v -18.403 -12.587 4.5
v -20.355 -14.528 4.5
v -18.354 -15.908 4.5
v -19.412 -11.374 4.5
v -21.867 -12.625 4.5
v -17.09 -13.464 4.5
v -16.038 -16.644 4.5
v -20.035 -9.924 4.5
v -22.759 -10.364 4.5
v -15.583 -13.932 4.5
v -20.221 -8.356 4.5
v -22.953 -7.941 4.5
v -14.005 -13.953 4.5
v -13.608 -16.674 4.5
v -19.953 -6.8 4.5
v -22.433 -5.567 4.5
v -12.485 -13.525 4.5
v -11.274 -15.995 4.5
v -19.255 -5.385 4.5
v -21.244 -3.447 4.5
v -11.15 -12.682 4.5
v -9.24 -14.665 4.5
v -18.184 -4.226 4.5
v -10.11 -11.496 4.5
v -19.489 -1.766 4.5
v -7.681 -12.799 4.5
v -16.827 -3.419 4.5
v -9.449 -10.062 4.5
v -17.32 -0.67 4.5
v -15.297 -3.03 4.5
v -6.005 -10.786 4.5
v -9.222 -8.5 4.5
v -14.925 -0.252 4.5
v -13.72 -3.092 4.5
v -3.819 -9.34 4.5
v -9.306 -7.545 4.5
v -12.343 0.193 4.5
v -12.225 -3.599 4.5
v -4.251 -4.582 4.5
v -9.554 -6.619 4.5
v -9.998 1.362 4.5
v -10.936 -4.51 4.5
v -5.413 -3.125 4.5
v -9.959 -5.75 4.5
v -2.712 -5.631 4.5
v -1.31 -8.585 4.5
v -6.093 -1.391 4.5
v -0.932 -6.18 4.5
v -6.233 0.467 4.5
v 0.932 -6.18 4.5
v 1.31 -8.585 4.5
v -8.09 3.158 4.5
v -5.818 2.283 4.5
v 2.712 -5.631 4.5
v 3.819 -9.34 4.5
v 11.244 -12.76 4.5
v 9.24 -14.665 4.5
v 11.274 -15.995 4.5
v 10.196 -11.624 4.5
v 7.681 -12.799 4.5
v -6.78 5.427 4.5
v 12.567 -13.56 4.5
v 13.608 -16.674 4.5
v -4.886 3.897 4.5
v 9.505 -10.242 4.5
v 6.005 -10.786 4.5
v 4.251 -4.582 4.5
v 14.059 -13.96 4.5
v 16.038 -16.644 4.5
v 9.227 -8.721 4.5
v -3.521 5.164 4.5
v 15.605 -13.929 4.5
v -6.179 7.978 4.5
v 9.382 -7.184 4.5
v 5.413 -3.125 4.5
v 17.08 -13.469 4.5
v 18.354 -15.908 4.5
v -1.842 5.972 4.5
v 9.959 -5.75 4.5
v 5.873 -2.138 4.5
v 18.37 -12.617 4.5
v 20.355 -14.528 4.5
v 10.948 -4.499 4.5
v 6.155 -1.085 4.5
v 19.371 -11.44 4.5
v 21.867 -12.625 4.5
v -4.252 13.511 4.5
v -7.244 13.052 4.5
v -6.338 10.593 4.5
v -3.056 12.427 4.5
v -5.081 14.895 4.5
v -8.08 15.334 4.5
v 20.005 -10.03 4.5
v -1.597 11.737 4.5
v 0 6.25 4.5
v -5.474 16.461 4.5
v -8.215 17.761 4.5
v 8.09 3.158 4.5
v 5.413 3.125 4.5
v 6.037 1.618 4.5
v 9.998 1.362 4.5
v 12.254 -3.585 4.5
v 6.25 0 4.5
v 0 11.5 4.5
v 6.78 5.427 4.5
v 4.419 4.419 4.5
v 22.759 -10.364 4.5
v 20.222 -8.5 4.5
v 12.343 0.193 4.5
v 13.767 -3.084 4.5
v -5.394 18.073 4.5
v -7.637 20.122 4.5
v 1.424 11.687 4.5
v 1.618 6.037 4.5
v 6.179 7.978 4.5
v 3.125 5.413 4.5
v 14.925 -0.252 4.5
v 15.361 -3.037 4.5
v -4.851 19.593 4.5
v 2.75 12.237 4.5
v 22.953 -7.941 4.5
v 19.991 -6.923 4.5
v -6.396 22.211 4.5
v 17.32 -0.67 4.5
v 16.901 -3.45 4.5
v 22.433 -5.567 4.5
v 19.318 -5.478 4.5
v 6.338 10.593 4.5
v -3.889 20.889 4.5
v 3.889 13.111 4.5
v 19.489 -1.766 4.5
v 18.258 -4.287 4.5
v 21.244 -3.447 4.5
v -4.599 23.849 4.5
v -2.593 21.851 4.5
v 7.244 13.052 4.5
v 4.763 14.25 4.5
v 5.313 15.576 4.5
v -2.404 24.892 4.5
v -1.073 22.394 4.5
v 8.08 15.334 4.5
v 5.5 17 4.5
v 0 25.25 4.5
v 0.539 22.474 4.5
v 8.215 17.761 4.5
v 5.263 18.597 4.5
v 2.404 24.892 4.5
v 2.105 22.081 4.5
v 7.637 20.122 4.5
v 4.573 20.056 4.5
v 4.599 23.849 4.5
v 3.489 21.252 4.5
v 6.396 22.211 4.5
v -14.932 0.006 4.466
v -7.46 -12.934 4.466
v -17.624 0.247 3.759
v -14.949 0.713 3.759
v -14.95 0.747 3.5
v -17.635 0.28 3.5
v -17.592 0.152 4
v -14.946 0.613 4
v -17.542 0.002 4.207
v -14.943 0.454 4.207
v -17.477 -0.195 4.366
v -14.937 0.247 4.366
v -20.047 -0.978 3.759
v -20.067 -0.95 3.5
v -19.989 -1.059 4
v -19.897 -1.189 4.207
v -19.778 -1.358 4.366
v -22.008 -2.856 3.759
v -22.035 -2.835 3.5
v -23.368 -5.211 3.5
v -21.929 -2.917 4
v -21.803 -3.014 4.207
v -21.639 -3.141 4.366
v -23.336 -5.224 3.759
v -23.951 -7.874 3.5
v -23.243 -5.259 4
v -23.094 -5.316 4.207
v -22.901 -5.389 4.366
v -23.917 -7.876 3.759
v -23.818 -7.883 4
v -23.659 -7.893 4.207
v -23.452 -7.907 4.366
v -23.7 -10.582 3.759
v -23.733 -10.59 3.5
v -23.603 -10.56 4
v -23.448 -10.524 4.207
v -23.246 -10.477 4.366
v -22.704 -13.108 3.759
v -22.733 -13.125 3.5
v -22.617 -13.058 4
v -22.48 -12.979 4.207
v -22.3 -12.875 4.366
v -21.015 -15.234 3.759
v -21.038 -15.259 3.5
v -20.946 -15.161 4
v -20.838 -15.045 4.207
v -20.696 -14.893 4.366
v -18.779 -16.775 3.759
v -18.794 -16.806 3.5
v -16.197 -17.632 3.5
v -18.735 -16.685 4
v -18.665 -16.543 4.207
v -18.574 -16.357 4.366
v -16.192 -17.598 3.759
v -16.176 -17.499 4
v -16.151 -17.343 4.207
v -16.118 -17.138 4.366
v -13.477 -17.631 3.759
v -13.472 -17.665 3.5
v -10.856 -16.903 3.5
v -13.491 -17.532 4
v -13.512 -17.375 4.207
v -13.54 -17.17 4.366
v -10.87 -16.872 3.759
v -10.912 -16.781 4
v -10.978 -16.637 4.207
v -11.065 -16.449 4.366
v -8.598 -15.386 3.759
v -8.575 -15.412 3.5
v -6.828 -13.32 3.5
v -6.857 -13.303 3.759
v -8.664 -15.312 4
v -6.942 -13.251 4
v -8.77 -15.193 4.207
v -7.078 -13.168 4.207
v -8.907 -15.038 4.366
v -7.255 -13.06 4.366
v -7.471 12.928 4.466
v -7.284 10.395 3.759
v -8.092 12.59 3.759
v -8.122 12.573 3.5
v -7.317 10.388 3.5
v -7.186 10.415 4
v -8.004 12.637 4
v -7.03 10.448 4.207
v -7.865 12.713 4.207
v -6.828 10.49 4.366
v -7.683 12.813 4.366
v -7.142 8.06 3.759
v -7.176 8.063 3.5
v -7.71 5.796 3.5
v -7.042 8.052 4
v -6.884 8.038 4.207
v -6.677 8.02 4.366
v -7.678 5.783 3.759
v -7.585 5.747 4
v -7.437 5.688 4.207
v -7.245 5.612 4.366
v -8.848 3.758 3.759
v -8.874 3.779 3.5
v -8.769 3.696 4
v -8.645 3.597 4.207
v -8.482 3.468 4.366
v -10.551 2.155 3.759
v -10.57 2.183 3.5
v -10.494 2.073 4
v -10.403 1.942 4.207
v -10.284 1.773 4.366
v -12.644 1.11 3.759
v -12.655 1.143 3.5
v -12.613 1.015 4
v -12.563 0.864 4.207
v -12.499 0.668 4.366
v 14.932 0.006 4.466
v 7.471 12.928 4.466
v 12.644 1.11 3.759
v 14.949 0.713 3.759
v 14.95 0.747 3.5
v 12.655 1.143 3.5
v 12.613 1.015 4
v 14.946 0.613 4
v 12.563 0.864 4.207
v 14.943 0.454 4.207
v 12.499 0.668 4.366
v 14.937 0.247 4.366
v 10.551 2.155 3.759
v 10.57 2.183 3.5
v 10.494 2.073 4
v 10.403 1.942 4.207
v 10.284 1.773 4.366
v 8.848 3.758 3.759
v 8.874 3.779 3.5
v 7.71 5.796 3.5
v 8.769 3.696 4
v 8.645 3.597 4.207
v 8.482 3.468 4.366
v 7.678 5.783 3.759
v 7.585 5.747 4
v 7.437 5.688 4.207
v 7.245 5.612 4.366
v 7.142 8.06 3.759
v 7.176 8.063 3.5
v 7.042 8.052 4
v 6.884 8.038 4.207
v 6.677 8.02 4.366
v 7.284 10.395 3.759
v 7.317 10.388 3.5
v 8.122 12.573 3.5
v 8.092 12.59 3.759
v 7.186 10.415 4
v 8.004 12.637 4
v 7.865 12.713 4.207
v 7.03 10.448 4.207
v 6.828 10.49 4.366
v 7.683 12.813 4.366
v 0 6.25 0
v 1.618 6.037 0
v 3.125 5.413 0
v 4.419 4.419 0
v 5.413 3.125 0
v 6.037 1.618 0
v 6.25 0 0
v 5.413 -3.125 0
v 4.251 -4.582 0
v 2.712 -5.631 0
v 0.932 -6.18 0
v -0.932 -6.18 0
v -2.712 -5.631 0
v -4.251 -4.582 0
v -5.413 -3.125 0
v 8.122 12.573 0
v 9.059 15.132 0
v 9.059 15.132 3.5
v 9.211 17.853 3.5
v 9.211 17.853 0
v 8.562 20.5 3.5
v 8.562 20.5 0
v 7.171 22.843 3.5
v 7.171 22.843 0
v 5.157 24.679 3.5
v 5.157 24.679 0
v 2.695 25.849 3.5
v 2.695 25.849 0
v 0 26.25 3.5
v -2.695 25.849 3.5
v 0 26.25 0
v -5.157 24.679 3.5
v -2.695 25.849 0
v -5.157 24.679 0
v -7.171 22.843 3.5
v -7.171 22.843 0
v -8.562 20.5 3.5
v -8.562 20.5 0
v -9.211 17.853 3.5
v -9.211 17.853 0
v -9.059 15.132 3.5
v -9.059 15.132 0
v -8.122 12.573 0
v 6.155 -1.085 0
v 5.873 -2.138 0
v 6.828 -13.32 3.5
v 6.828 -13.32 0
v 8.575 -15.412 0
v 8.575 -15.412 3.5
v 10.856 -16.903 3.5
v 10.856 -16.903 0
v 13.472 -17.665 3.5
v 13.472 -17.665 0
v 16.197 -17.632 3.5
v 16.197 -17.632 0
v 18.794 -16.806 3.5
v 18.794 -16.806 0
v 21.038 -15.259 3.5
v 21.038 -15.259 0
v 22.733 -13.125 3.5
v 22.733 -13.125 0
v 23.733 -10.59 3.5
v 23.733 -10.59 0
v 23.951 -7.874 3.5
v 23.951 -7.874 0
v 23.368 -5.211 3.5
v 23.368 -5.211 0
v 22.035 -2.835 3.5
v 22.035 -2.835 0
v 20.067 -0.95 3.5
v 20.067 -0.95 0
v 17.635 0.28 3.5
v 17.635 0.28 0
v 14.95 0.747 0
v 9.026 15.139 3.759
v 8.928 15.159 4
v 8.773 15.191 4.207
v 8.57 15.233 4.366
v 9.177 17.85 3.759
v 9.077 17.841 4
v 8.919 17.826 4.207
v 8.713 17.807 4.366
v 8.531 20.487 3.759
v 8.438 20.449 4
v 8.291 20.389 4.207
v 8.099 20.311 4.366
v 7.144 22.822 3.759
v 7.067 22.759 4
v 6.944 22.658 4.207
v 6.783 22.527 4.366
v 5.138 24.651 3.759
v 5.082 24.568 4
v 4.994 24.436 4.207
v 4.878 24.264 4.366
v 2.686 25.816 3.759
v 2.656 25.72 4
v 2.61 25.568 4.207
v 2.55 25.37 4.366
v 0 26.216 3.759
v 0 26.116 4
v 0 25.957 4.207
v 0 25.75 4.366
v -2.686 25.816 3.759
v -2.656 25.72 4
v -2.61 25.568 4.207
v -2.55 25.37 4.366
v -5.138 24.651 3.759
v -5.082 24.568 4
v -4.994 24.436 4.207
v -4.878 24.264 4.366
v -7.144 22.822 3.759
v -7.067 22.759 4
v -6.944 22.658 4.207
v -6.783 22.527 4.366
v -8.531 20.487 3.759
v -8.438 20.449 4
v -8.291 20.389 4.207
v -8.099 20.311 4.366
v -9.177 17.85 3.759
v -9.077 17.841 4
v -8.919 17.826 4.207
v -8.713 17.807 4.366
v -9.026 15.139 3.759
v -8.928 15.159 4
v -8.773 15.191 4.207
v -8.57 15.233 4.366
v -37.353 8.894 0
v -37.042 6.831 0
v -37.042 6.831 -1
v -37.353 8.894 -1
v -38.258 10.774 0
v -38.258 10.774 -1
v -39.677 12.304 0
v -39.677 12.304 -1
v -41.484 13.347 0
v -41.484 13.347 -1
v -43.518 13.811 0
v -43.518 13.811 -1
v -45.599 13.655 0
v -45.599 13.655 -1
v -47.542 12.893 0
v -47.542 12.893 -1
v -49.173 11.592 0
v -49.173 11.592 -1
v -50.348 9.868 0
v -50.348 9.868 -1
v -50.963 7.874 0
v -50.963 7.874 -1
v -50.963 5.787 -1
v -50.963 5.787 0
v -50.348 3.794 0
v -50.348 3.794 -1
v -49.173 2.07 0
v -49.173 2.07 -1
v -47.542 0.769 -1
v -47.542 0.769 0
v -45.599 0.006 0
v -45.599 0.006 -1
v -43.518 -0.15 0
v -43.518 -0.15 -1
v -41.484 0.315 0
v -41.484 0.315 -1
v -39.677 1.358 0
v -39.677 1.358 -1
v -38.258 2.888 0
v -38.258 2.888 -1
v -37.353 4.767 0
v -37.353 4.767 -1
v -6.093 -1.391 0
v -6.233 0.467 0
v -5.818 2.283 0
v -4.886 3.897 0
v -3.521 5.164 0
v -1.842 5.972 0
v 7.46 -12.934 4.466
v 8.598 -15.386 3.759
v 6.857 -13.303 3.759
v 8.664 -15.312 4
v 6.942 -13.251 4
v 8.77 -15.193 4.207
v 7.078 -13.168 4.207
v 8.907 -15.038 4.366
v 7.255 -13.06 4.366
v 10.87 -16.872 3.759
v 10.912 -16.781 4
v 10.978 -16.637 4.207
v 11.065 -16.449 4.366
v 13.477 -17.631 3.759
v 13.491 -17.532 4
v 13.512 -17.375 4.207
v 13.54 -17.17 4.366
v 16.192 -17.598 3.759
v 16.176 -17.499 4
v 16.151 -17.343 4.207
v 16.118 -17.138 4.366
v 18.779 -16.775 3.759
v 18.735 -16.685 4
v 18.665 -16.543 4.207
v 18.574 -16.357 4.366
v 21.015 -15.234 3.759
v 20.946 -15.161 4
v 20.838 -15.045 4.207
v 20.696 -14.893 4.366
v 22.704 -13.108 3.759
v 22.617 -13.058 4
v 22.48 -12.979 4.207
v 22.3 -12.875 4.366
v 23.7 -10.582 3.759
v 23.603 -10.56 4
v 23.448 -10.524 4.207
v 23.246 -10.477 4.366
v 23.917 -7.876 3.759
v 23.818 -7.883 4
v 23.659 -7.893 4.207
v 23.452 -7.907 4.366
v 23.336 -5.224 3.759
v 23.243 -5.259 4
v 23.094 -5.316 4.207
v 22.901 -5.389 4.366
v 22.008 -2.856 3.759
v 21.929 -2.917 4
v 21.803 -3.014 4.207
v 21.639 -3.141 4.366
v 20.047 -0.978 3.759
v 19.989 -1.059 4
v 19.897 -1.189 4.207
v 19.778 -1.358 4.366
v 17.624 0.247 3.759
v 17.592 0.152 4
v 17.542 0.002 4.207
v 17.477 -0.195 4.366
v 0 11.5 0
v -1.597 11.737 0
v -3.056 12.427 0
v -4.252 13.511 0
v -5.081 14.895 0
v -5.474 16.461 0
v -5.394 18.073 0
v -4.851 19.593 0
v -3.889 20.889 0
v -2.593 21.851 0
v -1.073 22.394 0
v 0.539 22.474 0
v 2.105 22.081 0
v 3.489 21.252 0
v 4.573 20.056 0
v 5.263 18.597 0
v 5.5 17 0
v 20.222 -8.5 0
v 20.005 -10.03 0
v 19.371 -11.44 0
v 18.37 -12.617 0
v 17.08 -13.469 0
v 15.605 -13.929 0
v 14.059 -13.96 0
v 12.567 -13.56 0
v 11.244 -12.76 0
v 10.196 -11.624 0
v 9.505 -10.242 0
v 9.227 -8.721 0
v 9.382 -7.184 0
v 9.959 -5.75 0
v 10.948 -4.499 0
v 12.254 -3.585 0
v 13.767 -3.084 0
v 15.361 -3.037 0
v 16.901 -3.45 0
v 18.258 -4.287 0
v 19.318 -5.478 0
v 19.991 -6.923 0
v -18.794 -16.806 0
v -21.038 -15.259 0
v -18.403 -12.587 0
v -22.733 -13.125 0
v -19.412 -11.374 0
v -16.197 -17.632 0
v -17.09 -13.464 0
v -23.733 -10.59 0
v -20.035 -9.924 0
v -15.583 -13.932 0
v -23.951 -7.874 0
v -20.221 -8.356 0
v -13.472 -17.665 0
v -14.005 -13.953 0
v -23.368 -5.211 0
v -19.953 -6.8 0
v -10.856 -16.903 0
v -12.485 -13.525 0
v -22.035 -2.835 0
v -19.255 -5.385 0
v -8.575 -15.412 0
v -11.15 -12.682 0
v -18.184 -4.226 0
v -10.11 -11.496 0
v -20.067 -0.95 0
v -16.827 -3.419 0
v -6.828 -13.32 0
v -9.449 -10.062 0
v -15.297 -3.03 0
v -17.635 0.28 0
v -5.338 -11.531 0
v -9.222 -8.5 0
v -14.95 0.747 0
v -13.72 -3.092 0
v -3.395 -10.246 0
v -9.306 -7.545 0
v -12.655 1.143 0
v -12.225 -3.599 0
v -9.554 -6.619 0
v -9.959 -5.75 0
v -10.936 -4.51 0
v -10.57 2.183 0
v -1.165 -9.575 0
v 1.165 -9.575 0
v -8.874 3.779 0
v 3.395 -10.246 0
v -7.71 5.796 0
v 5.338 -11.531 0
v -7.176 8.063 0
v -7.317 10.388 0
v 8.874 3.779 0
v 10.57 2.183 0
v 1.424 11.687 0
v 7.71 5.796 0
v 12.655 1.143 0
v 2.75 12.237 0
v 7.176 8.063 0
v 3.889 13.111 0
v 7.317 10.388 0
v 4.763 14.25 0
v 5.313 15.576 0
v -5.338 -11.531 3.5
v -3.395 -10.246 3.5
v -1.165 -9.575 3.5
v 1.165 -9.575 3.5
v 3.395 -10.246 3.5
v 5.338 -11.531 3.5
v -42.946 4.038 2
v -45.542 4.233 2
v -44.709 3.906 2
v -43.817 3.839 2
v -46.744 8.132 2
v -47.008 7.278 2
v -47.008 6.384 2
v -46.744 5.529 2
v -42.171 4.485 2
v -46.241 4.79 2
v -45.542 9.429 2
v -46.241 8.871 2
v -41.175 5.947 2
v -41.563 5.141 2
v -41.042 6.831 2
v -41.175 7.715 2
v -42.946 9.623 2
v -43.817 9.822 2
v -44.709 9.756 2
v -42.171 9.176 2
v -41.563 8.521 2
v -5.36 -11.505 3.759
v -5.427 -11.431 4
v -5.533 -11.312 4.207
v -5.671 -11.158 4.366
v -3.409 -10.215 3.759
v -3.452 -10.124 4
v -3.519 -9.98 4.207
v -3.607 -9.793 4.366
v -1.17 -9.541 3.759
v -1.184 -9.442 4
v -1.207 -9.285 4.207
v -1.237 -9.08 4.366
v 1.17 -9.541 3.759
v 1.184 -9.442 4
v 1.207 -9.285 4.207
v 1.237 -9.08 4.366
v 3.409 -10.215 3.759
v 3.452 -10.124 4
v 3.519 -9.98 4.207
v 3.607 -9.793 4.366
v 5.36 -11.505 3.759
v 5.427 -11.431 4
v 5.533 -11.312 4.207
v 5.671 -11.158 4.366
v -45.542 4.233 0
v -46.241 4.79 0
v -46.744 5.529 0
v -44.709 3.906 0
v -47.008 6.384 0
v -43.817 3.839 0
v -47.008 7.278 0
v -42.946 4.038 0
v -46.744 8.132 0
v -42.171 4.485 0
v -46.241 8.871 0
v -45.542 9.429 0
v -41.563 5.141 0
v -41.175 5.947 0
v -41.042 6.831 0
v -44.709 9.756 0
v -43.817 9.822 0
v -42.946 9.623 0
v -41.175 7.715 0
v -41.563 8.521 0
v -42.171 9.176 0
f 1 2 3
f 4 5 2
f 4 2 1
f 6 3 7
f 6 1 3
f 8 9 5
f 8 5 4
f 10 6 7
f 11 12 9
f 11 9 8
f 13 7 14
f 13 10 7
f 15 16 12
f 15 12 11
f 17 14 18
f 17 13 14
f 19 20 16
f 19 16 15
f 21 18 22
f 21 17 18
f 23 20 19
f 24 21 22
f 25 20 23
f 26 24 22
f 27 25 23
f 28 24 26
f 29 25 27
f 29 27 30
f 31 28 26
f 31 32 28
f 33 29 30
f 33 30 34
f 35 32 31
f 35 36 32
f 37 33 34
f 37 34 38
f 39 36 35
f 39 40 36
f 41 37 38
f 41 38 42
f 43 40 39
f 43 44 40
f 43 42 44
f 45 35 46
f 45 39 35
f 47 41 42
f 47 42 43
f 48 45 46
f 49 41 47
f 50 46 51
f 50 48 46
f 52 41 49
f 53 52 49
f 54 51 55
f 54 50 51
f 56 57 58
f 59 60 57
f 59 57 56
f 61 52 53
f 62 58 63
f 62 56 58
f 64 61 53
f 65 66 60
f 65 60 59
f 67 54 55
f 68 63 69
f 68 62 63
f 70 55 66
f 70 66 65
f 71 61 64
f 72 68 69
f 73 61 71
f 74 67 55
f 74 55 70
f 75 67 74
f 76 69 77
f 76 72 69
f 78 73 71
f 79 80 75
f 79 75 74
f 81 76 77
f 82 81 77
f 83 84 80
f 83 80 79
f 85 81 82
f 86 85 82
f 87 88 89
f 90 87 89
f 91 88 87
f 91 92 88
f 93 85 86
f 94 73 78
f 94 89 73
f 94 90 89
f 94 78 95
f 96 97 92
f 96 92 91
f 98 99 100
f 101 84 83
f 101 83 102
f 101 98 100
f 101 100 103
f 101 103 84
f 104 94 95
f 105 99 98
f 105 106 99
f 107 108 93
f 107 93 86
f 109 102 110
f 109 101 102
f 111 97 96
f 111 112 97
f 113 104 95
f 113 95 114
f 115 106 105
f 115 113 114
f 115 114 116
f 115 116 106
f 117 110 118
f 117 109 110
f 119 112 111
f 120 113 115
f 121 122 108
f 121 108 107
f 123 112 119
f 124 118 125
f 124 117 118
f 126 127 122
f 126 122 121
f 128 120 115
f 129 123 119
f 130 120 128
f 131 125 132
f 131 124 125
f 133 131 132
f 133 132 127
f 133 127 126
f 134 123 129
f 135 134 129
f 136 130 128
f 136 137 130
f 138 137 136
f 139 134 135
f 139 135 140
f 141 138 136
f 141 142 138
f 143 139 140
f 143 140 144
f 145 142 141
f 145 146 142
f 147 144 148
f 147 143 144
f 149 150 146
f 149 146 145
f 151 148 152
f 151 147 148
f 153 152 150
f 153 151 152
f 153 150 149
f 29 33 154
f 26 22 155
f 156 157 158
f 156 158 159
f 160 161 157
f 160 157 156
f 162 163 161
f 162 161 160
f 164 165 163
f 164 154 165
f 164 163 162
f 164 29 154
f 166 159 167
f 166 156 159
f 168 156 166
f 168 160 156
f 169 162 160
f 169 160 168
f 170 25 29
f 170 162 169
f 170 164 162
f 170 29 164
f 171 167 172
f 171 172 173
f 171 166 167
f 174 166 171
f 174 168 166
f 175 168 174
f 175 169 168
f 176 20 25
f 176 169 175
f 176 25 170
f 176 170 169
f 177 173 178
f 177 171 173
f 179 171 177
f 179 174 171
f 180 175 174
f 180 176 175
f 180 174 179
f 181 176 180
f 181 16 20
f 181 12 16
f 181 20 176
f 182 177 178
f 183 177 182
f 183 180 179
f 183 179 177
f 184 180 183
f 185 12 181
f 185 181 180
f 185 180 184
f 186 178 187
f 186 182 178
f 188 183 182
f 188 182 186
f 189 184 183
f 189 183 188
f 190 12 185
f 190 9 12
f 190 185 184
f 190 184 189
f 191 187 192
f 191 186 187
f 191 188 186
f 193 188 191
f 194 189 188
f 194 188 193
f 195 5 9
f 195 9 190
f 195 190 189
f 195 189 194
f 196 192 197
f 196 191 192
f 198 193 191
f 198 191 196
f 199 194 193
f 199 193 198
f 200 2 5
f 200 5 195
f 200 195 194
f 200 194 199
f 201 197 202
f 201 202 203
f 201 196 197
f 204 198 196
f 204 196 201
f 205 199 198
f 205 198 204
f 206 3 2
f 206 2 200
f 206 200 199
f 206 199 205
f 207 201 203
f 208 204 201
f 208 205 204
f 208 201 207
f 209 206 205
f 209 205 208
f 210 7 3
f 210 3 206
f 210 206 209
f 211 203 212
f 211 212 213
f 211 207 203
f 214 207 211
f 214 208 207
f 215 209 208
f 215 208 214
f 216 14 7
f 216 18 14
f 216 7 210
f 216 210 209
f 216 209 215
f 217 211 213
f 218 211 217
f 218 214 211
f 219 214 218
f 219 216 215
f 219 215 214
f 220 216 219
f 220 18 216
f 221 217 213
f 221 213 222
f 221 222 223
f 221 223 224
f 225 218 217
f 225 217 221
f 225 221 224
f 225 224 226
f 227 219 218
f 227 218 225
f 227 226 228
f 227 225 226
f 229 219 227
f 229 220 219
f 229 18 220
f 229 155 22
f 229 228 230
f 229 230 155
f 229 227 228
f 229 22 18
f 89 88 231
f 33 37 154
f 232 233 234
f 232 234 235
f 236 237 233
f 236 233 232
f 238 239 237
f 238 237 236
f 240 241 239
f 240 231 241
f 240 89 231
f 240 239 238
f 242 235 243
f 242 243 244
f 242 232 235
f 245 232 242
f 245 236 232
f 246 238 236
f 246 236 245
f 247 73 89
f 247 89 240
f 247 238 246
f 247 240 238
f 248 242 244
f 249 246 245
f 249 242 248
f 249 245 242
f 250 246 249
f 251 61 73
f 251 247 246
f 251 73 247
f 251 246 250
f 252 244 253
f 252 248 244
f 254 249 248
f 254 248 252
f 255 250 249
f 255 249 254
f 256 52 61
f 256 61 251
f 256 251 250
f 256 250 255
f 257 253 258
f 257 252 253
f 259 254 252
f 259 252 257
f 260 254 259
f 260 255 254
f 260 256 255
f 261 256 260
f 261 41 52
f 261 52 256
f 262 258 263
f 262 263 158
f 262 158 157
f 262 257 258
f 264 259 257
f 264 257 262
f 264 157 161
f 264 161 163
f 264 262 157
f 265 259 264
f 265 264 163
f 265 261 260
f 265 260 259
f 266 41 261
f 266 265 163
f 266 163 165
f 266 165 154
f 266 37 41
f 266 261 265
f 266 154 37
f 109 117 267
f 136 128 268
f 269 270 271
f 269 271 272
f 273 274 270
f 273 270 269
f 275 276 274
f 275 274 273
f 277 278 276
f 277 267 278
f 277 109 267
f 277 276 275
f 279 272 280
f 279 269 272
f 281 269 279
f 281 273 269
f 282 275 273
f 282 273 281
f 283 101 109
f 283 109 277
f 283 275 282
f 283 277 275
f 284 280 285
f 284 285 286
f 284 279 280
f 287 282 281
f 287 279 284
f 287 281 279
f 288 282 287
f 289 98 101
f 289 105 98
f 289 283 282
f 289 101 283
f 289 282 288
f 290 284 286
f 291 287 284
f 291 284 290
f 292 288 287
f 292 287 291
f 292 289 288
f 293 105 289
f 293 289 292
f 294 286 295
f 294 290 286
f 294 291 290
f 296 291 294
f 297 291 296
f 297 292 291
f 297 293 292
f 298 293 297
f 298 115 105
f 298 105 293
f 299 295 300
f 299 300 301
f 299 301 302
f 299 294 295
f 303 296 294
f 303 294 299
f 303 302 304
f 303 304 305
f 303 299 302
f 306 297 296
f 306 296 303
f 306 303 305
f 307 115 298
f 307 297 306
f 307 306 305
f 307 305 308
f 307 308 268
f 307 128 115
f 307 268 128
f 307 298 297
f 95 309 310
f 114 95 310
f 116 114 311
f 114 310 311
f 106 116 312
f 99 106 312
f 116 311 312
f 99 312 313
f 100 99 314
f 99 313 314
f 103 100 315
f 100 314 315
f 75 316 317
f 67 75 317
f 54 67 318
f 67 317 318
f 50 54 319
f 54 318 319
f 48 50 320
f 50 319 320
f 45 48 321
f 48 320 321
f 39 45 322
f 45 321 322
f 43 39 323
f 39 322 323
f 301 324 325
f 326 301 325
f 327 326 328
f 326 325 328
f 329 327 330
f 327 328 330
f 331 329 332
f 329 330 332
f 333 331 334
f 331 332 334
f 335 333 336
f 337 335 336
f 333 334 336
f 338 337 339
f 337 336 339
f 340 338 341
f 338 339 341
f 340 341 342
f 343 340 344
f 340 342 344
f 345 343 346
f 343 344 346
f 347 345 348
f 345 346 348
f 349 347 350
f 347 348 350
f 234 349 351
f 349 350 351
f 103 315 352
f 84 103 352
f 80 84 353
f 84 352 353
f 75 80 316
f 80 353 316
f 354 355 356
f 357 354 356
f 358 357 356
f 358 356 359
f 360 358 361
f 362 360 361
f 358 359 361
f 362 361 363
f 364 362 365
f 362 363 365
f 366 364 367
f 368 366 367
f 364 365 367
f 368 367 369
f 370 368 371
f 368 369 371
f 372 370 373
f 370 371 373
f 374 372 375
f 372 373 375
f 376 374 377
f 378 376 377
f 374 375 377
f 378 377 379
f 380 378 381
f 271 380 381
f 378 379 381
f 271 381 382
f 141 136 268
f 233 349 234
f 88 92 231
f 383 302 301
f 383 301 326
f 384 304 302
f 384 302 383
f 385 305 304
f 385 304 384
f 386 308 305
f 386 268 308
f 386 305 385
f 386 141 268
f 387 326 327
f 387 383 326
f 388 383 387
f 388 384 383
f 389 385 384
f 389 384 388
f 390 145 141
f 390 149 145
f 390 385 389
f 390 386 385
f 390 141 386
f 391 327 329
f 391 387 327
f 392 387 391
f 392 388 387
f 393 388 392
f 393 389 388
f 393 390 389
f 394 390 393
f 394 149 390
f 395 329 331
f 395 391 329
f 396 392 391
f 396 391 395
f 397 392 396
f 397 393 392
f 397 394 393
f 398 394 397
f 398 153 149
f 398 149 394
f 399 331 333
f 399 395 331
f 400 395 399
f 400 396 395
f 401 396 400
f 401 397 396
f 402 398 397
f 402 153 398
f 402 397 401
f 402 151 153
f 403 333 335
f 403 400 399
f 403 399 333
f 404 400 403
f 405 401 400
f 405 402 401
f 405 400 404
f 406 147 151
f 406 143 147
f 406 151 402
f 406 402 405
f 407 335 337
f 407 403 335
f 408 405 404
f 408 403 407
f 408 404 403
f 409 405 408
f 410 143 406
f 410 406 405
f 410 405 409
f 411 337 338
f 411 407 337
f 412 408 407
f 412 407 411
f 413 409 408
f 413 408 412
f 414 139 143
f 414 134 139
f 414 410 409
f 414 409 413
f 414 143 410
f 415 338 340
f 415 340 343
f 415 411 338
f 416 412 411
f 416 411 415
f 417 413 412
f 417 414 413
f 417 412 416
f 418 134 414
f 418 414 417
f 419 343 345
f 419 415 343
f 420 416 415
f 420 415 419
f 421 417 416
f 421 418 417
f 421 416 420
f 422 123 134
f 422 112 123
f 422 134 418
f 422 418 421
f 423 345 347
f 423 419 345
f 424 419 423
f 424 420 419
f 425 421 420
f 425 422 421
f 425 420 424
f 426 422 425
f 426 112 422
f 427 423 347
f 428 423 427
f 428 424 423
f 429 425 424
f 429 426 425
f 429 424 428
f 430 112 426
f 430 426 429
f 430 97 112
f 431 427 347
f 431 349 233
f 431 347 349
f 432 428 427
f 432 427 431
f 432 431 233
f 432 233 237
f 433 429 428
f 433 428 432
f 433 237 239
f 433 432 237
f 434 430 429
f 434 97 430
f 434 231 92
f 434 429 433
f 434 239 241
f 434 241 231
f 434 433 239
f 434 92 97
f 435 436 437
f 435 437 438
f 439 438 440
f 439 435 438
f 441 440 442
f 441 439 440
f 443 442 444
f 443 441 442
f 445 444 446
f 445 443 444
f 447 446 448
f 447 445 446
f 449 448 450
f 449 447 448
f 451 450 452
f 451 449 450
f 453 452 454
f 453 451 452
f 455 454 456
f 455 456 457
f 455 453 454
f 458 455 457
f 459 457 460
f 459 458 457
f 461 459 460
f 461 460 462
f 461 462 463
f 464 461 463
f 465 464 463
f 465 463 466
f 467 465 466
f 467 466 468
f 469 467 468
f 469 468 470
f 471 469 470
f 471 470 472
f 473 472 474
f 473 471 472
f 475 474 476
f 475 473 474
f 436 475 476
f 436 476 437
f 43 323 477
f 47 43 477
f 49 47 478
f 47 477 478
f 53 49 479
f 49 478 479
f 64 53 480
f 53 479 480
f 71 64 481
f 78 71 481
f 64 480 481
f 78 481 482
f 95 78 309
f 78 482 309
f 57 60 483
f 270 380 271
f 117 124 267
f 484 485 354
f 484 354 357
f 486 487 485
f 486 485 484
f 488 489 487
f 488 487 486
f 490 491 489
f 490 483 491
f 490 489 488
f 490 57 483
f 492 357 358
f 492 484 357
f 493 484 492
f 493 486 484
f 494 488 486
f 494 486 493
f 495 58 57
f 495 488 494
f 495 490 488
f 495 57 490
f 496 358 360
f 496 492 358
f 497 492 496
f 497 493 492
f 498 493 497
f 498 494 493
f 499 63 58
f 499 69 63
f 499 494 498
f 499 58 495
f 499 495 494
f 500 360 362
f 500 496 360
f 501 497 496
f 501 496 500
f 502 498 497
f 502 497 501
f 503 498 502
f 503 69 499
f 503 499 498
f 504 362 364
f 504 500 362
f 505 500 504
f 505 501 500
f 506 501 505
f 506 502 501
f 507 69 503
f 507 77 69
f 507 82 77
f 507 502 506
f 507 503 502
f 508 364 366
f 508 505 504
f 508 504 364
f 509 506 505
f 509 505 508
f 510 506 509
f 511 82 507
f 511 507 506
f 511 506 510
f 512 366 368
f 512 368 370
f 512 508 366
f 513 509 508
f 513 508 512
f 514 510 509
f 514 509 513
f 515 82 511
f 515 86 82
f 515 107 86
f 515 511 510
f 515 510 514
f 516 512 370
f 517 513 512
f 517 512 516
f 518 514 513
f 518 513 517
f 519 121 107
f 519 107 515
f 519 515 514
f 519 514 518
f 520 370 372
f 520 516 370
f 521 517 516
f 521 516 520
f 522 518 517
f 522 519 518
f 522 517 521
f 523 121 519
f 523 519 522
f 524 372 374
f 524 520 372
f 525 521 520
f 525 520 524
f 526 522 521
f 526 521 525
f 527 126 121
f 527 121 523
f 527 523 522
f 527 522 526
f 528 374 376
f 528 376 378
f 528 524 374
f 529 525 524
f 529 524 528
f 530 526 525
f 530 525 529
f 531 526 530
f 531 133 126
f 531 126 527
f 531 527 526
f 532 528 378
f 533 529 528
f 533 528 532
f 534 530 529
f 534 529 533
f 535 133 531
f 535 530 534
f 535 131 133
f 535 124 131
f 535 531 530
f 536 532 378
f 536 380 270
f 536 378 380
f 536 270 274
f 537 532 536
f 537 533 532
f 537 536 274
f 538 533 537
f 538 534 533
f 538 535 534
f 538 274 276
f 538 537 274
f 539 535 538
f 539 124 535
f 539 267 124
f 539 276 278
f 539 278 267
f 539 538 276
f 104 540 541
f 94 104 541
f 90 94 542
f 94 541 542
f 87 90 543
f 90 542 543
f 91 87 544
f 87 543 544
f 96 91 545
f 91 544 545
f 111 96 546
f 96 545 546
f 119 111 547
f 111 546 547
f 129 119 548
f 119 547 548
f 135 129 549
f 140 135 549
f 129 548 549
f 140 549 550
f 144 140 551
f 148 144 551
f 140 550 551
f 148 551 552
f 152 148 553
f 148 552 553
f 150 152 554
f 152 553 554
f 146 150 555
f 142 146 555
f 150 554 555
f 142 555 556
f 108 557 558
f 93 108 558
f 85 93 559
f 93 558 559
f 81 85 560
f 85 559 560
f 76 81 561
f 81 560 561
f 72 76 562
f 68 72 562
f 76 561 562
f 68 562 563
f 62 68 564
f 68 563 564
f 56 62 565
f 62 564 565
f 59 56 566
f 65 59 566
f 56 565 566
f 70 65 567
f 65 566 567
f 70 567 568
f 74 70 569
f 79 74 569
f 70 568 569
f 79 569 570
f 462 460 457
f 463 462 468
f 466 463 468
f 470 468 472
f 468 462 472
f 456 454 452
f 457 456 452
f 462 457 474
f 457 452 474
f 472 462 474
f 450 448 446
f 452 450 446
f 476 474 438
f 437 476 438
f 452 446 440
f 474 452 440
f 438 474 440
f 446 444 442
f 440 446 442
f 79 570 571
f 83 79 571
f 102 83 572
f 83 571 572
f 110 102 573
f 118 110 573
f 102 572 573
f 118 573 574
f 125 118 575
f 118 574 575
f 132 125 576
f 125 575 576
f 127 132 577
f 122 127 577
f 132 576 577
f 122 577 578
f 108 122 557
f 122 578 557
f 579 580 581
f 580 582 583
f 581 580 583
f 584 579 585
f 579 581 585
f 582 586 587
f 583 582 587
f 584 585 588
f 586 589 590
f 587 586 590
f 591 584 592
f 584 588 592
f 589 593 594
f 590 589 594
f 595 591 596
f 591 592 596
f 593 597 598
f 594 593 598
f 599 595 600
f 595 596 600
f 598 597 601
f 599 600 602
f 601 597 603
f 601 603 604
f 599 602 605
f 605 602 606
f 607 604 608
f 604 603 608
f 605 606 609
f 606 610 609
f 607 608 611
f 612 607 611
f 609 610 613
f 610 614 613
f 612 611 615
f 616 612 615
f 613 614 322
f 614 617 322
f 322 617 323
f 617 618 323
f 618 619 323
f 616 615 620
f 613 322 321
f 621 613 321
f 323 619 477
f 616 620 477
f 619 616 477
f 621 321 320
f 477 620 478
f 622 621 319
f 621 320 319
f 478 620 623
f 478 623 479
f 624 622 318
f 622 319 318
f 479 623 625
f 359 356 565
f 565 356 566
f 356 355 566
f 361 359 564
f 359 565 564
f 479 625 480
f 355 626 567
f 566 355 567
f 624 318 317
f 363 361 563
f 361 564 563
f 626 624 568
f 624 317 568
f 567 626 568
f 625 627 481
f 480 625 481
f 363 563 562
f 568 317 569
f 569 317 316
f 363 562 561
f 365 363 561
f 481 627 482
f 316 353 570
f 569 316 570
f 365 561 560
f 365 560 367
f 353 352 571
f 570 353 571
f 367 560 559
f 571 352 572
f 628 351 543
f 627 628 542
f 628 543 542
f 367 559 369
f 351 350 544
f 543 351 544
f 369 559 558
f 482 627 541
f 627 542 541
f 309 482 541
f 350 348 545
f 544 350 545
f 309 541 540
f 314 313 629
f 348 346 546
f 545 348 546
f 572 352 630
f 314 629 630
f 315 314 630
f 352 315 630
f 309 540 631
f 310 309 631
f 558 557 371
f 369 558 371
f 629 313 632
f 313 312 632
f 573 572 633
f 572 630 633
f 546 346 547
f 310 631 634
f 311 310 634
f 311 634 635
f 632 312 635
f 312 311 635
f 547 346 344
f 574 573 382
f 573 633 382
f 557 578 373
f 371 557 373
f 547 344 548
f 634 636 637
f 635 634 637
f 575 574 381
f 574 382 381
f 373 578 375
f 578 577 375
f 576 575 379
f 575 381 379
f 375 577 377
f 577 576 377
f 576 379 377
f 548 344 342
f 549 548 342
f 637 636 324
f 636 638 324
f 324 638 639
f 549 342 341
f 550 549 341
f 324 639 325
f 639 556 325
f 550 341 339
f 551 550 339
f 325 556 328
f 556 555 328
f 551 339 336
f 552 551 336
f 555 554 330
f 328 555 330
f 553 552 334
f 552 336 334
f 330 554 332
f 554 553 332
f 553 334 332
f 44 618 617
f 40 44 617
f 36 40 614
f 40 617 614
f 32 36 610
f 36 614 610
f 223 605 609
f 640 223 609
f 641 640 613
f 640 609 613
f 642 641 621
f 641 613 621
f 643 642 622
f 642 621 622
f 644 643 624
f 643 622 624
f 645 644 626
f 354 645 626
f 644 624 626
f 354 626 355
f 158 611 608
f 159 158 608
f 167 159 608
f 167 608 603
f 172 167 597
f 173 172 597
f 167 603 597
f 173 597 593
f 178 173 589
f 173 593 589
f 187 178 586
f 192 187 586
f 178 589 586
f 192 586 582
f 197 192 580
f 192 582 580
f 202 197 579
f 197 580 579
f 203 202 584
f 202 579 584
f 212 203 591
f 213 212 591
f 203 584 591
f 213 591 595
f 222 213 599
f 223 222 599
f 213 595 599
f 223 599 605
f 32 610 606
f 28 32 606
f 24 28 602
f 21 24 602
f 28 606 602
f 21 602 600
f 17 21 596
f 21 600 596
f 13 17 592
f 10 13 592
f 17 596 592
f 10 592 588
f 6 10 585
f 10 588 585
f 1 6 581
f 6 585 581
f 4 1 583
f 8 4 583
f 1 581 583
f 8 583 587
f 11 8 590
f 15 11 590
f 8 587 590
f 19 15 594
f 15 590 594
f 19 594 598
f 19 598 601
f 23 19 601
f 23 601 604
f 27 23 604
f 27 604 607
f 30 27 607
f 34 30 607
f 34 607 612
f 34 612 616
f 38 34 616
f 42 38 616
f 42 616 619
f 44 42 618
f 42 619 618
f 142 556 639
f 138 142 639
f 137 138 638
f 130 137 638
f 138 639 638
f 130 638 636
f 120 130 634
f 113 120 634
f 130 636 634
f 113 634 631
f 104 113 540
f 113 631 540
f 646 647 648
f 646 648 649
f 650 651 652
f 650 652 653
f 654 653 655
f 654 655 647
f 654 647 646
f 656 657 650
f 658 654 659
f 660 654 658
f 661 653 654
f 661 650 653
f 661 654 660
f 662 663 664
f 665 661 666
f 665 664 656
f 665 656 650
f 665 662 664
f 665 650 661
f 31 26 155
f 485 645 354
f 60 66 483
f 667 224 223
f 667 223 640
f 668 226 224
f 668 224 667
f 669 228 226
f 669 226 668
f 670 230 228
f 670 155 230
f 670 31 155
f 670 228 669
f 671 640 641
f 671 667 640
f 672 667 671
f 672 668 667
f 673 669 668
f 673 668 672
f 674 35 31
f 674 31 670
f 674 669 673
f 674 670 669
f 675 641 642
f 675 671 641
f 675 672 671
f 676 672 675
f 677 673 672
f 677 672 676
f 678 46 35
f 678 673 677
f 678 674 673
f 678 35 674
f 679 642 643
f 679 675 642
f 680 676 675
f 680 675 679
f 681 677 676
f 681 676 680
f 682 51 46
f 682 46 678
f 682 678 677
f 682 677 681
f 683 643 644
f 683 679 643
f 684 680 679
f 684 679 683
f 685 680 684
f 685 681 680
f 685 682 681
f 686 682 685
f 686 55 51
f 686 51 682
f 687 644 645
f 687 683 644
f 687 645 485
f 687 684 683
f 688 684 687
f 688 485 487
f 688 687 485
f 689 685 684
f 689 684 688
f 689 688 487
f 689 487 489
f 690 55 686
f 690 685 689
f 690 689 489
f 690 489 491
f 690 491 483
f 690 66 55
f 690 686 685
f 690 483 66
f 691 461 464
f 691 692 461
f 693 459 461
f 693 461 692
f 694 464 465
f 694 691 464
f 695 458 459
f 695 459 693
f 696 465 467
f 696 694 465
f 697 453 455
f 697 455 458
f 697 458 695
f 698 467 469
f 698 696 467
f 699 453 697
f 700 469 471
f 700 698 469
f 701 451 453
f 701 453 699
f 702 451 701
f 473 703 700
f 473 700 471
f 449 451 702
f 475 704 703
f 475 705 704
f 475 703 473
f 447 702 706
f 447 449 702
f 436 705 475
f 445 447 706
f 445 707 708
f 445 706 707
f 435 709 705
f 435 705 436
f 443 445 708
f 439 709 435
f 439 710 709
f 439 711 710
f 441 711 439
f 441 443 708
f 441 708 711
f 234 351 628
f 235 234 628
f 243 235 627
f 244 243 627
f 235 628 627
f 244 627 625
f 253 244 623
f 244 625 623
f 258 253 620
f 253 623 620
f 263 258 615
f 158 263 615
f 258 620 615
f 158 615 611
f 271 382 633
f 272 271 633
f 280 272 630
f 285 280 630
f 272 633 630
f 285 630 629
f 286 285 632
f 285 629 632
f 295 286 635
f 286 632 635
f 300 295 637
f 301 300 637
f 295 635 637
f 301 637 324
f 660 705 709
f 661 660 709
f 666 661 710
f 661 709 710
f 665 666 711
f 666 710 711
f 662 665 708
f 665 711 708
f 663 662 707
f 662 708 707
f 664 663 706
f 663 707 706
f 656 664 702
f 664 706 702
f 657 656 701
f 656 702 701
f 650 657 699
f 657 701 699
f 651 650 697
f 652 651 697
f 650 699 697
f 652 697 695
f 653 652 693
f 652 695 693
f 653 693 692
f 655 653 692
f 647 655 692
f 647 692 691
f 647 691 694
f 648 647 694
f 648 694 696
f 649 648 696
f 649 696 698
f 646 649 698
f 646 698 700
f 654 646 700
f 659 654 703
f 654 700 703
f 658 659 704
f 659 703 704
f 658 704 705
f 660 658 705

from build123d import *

# Parameters (mm, degrees)
F1_DEPTH = 4.5
F2_R     = 3
F3_DEPTH = 2
F2_R_2   = 7
F4_DEPTH = 1
F5_R     = 1


with BuildPart() as f1:
    # F0 (on Top) → F1 (new body)
    with BuildSketch(Plane.XY):
        with BuildLine():
            ThreePointArc((14.9497868783, 0.7472055075), (8.2182150114, 4.7447886491), (8.1219923905, 12.573292464))
            ThreePointArc((8.1219923905, 12.573292464), (0, 26.25), (-8.1219923905, 12.573292464))
            ThreePointArc((-8.1219923905, 12.573292464), (-8.2182150114, 4.7447886491), (-14.9497868783, 0.7472055075))
            ThreePointArc((-14.9497868783, 0.7472055075), (-22.7331668493, -13.125), (-6.8277944878, -13.3204979715))
            ThreePointArc((-6.8277944878, -13.3204979715), (0, -9.4895772982), (6.8277944878, -13.3204979715))
            ThreePointArc((6.8277944878, -13.3204979715), (22.7331668493, -13.125), (14.9497868783, 0.7472055075))
        make_face()
        with BuildLine():
            ThreePointArc((-9.2224318643, -8.5), (-20.0350239089, -9.9235047481), (-9.9592921435, -5.75))
            ThreePointArc((-9.9592921435, -5.75), (-9.4098398197, -7.0764952519), (-9.2224318643, -8.5))
        make_face(mode=Mode.SUBTRACT)
        with BuildLine():
            ThreePointArc((0, 6.25), (4.4194173824, 4.4194173824), (6.25, 0))
            ThreePointArc((6.25, 0), (6.0370364143, -1.6176190319), (5.4126587737, -3.125))
            ThreePointArc((5.4126587737, -3.125), (0, -6.25), (-5.4126587737, -3.125))
            ThreePointArc((-5.4126587737, -3.125), (-5.4126587737, 3.125), (0, 6.25))
        make_face(mode=Mode.SUBTRACT)
        with BuildLine():
            ThreePointArc((20.2224318643, -8.5), (13.2989271163, -13.8125920446), (9.9592921435, -5.75))
            ThreePointArc((9.9592921435, -5.75), (16.1459366124, -3.1874079554), (20.2224318643, -8.5))
        make_face(mode=Mode.SUBTRACT)
        with BuildLine():
            ThreePointArc((5.5, 17), (3.8890872965, 13.1109127035), (0, 11.5))
            ThreePointArc((0, 11.5), (-3.8890872965, 20.8890872965), (5.5, 17))
        make_face(mode=Mode.SUBTRACT)
    extrude(amount=F1_DEPTH)

    # F5
    f5_edges = [f1.edges().sort_by_distance(p)[0] for p in [
        (0, -9.489577, 4.5),
        (-22.733167, -13.125, 4.5),
        (-8.218215, 4.744789, 4.5),
        (0, 26.25, 4.5),
        (8.218215, 4.744789, 4.5),
        (22.733167, -13.125, 4.5),
    ]]
    fillet(f5_edges, radius=F5_R)


with BuildPart() as f3:
    # F2 (on Top) → F3 (new body)
    with BuildSketch(Plane.XY):
        with Locations((-44.0415814519, 6.8307667971)):
            Circle(F2_R)
    extrude(amount=F3_DEPTH)

    # F2 (on Top) → F4 (join)
    with BuildSketch(Plane.XY):
        with Locations((-44.0415814519, 6.8307667971)):
            Circle(F2_R_2)
        with Locations((-44.0415814519, 6.8307667971)):
            Circle(F2_R, mode=Mode.SUBTRACT)
        with Locations((-44.0415814519, 6.8307667971)):
            Circle(F2_R)
    extrude(amount=-F4_DEPTH)


solid = Compound([f1.part, f3.part])
